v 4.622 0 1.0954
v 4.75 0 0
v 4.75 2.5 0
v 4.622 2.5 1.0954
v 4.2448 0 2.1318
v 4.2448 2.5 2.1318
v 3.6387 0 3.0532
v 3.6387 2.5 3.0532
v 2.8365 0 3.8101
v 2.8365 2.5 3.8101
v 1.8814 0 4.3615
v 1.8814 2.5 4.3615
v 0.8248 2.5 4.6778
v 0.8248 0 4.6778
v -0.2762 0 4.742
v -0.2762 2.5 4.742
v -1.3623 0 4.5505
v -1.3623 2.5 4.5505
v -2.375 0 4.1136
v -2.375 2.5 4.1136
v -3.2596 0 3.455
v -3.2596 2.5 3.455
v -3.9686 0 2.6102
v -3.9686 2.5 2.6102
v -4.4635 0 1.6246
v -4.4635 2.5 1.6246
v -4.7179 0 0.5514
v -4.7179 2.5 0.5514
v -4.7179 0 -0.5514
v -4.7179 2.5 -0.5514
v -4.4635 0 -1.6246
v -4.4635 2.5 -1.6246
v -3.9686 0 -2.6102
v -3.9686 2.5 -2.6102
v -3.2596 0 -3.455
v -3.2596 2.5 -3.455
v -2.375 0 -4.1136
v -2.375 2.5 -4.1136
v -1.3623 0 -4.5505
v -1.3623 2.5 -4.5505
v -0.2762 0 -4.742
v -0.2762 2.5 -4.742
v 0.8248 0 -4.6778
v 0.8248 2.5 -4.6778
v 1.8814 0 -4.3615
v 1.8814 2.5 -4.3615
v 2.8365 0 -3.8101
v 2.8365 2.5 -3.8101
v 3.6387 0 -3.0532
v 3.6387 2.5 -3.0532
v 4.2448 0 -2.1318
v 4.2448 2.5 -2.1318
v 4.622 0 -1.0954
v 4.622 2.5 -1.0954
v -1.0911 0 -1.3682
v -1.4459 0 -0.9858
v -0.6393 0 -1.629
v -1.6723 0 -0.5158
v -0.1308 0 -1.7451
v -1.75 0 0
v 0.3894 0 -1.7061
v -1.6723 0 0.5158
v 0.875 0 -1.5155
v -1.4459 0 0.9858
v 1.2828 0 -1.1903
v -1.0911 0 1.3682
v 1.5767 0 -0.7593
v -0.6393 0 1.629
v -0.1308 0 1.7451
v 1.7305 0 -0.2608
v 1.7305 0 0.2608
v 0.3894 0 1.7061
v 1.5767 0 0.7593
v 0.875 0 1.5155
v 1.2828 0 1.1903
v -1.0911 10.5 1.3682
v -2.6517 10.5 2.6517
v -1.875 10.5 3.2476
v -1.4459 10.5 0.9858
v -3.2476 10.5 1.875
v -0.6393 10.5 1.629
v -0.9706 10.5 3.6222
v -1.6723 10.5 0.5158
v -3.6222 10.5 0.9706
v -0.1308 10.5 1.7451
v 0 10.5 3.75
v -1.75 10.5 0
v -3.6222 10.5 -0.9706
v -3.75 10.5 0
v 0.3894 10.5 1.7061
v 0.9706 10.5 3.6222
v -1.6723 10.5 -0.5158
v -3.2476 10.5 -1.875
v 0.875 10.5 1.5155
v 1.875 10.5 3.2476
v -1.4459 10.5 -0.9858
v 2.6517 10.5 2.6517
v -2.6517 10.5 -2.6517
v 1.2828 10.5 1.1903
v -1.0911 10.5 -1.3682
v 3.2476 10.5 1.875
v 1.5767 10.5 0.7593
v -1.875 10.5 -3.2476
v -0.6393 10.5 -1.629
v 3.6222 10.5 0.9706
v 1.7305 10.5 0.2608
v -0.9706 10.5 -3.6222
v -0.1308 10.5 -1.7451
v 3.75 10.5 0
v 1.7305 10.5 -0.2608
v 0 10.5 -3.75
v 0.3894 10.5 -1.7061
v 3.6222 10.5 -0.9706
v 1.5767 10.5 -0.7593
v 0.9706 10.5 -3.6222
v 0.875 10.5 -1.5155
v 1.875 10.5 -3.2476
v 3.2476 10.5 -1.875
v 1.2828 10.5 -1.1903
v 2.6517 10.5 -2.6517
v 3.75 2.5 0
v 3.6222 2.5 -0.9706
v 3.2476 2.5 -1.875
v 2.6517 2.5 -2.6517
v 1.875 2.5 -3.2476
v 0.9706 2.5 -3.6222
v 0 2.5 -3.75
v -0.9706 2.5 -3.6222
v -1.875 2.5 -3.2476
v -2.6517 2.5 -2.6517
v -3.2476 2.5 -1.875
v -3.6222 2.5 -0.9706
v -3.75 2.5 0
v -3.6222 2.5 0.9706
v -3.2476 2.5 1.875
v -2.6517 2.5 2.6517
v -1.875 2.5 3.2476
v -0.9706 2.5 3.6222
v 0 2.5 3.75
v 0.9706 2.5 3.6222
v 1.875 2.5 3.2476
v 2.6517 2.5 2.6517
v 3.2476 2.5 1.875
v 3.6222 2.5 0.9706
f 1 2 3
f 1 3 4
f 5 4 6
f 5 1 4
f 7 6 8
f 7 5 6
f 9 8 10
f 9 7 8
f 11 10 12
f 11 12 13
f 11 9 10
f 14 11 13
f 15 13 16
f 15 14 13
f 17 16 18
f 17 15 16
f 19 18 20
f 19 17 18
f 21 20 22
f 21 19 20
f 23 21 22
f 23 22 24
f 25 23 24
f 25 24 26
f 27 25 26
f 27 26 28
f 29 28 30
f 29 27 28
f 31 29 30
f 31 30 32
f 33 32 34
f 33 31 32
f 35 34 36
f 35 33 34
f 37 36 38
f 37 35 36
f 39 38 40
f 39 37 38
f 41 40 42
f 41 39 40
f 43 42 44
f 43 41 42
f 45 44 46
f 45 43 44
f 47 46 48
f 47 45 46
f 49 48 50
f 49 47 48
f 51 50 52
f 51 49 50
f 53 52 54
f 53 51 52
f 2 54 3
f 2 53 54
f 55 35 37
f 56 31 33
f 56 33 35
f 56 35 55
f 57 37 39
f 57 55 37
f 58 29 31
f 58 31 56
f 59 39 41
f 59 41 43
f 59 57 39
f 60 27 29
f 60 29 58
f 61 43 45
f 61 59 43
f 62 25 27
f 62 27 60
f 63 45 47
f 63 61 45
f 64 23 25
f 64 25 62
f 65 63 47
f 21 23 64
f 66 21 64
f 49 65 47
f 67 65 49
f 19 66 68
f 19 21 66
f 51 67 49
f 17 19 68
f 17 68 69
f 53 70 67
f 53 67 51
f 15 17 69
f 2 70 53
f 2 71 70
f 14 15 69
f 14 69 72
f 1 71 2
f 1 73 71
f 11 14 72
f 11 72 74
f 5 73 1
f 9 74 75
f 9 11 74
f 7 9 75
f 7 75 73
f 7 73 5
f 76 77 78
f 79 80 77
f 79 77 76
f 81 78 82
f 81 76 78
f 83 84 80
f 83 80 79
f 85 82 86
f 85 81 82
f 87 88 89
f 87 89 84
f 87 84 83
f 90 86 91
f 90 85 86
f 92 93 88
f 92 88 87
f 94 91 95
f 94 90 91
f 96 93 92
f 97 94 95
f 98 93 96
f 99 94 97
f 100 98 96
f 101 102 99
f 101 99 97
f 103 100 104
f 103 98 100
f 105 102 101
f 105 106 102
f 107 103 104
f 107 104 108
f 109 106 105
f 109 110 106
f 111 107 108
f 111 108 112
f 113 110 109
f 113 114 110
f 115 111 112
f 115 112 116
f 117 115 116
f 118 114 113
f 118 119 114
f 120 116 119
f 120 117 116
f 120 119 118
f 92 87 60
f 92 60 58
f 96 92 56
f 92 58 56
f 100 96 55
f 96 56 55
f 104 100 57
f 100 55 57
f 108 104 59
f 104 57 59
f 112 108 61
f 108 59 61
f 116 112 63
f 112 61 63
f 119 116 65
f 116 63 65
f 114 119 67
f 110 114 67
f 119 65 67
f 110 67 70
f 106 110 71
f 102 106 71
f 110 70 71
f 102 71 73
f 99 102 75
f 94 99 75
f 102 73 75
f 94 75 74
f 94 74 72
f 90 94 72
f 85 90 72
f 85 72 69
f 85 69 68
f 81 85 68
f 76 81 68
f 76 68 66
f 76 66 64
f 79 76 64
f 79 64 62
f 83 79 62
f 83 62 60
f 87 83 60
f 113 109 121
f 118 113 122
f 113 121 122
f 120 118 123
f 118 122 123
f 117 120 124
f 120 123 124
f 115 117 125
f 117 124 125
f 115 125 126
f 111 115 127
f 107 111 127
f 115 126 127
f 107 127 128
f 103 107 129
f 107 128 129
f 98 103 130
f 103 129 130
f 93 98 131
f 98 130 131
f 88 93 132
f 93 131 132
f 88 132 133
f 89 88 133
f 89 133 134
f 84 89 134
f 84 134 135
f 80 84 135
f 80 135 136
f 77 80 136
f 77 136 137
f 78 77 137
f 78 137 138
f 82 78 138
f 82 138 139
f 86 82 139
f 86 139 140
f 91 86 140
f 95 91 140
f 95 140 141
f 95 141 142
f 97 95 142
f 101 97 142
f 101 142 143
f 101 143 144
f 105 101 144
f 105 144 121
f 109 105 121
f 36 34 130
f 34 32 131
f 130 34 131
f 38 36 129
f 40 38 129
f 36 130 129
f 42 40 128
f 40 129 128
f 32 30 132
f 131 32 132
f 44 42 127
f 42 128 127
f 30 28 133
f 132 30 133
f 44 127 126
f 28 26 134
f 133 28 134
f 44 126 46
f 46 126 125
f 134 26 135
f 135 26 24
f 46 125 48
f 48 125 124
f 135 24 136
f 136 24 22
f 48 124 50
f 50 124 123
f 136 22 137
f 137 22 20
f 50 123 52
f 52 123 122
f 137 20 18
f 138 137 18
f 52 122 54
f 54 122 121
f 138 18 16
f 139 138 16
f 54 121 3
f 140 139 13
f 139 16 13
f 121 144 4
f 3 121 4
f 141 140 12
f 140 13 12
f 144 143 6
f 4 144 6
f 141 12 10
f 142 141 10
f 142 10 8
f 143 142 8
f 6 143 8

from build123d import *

# Parameters (mm, degrees)
SKETCH1_R                  = 3.75
BOSS_EXTRUDE1_DEPTH        = 10.5
F_3_5_3_5_DIAMETER_HOLE1_D = 3.5
SKETCH5_R                  = 4.75
SKETCH5_R_2                = 3.75
BOSS_EXTRUDE2_DEPTH        = 2.5


with BuildPart() as part:
    # Sketch1 → Boss-Extrude1 (new body)
    with BuildSketch(Plane(origin=(0, 0, 0), x_dir=(1, 0, 0), z_dir=(0, 1, 0))):
        Circle(SKETCH1_R)
    extrude(amount=BOSS_EXTRUDE1_DEPTH)

    # Ø3.5 (3.5) Diameter Hole1 (through all)
    with Locations(Plane(origin=(0, 10.5, 0), x_dir=(1, 0, 0), z_dir=(0, 1, 0))):
        with Locations((0, 0)):
            Hole(F_3_5_3_5_DIAMETER_HOLE1_D / 2)

    # Sketch5 → Boss-Extrude2 (add)
    with BuildSketch(Plane.XZ):
        Circle(SKETCH5_R)
        Circle(SKETCH5_R_2, mode=Mode.SUBTRACT)
    extrude(amount=-BOSS_EXTRUDE2_DEPTH)


solid = part.part
